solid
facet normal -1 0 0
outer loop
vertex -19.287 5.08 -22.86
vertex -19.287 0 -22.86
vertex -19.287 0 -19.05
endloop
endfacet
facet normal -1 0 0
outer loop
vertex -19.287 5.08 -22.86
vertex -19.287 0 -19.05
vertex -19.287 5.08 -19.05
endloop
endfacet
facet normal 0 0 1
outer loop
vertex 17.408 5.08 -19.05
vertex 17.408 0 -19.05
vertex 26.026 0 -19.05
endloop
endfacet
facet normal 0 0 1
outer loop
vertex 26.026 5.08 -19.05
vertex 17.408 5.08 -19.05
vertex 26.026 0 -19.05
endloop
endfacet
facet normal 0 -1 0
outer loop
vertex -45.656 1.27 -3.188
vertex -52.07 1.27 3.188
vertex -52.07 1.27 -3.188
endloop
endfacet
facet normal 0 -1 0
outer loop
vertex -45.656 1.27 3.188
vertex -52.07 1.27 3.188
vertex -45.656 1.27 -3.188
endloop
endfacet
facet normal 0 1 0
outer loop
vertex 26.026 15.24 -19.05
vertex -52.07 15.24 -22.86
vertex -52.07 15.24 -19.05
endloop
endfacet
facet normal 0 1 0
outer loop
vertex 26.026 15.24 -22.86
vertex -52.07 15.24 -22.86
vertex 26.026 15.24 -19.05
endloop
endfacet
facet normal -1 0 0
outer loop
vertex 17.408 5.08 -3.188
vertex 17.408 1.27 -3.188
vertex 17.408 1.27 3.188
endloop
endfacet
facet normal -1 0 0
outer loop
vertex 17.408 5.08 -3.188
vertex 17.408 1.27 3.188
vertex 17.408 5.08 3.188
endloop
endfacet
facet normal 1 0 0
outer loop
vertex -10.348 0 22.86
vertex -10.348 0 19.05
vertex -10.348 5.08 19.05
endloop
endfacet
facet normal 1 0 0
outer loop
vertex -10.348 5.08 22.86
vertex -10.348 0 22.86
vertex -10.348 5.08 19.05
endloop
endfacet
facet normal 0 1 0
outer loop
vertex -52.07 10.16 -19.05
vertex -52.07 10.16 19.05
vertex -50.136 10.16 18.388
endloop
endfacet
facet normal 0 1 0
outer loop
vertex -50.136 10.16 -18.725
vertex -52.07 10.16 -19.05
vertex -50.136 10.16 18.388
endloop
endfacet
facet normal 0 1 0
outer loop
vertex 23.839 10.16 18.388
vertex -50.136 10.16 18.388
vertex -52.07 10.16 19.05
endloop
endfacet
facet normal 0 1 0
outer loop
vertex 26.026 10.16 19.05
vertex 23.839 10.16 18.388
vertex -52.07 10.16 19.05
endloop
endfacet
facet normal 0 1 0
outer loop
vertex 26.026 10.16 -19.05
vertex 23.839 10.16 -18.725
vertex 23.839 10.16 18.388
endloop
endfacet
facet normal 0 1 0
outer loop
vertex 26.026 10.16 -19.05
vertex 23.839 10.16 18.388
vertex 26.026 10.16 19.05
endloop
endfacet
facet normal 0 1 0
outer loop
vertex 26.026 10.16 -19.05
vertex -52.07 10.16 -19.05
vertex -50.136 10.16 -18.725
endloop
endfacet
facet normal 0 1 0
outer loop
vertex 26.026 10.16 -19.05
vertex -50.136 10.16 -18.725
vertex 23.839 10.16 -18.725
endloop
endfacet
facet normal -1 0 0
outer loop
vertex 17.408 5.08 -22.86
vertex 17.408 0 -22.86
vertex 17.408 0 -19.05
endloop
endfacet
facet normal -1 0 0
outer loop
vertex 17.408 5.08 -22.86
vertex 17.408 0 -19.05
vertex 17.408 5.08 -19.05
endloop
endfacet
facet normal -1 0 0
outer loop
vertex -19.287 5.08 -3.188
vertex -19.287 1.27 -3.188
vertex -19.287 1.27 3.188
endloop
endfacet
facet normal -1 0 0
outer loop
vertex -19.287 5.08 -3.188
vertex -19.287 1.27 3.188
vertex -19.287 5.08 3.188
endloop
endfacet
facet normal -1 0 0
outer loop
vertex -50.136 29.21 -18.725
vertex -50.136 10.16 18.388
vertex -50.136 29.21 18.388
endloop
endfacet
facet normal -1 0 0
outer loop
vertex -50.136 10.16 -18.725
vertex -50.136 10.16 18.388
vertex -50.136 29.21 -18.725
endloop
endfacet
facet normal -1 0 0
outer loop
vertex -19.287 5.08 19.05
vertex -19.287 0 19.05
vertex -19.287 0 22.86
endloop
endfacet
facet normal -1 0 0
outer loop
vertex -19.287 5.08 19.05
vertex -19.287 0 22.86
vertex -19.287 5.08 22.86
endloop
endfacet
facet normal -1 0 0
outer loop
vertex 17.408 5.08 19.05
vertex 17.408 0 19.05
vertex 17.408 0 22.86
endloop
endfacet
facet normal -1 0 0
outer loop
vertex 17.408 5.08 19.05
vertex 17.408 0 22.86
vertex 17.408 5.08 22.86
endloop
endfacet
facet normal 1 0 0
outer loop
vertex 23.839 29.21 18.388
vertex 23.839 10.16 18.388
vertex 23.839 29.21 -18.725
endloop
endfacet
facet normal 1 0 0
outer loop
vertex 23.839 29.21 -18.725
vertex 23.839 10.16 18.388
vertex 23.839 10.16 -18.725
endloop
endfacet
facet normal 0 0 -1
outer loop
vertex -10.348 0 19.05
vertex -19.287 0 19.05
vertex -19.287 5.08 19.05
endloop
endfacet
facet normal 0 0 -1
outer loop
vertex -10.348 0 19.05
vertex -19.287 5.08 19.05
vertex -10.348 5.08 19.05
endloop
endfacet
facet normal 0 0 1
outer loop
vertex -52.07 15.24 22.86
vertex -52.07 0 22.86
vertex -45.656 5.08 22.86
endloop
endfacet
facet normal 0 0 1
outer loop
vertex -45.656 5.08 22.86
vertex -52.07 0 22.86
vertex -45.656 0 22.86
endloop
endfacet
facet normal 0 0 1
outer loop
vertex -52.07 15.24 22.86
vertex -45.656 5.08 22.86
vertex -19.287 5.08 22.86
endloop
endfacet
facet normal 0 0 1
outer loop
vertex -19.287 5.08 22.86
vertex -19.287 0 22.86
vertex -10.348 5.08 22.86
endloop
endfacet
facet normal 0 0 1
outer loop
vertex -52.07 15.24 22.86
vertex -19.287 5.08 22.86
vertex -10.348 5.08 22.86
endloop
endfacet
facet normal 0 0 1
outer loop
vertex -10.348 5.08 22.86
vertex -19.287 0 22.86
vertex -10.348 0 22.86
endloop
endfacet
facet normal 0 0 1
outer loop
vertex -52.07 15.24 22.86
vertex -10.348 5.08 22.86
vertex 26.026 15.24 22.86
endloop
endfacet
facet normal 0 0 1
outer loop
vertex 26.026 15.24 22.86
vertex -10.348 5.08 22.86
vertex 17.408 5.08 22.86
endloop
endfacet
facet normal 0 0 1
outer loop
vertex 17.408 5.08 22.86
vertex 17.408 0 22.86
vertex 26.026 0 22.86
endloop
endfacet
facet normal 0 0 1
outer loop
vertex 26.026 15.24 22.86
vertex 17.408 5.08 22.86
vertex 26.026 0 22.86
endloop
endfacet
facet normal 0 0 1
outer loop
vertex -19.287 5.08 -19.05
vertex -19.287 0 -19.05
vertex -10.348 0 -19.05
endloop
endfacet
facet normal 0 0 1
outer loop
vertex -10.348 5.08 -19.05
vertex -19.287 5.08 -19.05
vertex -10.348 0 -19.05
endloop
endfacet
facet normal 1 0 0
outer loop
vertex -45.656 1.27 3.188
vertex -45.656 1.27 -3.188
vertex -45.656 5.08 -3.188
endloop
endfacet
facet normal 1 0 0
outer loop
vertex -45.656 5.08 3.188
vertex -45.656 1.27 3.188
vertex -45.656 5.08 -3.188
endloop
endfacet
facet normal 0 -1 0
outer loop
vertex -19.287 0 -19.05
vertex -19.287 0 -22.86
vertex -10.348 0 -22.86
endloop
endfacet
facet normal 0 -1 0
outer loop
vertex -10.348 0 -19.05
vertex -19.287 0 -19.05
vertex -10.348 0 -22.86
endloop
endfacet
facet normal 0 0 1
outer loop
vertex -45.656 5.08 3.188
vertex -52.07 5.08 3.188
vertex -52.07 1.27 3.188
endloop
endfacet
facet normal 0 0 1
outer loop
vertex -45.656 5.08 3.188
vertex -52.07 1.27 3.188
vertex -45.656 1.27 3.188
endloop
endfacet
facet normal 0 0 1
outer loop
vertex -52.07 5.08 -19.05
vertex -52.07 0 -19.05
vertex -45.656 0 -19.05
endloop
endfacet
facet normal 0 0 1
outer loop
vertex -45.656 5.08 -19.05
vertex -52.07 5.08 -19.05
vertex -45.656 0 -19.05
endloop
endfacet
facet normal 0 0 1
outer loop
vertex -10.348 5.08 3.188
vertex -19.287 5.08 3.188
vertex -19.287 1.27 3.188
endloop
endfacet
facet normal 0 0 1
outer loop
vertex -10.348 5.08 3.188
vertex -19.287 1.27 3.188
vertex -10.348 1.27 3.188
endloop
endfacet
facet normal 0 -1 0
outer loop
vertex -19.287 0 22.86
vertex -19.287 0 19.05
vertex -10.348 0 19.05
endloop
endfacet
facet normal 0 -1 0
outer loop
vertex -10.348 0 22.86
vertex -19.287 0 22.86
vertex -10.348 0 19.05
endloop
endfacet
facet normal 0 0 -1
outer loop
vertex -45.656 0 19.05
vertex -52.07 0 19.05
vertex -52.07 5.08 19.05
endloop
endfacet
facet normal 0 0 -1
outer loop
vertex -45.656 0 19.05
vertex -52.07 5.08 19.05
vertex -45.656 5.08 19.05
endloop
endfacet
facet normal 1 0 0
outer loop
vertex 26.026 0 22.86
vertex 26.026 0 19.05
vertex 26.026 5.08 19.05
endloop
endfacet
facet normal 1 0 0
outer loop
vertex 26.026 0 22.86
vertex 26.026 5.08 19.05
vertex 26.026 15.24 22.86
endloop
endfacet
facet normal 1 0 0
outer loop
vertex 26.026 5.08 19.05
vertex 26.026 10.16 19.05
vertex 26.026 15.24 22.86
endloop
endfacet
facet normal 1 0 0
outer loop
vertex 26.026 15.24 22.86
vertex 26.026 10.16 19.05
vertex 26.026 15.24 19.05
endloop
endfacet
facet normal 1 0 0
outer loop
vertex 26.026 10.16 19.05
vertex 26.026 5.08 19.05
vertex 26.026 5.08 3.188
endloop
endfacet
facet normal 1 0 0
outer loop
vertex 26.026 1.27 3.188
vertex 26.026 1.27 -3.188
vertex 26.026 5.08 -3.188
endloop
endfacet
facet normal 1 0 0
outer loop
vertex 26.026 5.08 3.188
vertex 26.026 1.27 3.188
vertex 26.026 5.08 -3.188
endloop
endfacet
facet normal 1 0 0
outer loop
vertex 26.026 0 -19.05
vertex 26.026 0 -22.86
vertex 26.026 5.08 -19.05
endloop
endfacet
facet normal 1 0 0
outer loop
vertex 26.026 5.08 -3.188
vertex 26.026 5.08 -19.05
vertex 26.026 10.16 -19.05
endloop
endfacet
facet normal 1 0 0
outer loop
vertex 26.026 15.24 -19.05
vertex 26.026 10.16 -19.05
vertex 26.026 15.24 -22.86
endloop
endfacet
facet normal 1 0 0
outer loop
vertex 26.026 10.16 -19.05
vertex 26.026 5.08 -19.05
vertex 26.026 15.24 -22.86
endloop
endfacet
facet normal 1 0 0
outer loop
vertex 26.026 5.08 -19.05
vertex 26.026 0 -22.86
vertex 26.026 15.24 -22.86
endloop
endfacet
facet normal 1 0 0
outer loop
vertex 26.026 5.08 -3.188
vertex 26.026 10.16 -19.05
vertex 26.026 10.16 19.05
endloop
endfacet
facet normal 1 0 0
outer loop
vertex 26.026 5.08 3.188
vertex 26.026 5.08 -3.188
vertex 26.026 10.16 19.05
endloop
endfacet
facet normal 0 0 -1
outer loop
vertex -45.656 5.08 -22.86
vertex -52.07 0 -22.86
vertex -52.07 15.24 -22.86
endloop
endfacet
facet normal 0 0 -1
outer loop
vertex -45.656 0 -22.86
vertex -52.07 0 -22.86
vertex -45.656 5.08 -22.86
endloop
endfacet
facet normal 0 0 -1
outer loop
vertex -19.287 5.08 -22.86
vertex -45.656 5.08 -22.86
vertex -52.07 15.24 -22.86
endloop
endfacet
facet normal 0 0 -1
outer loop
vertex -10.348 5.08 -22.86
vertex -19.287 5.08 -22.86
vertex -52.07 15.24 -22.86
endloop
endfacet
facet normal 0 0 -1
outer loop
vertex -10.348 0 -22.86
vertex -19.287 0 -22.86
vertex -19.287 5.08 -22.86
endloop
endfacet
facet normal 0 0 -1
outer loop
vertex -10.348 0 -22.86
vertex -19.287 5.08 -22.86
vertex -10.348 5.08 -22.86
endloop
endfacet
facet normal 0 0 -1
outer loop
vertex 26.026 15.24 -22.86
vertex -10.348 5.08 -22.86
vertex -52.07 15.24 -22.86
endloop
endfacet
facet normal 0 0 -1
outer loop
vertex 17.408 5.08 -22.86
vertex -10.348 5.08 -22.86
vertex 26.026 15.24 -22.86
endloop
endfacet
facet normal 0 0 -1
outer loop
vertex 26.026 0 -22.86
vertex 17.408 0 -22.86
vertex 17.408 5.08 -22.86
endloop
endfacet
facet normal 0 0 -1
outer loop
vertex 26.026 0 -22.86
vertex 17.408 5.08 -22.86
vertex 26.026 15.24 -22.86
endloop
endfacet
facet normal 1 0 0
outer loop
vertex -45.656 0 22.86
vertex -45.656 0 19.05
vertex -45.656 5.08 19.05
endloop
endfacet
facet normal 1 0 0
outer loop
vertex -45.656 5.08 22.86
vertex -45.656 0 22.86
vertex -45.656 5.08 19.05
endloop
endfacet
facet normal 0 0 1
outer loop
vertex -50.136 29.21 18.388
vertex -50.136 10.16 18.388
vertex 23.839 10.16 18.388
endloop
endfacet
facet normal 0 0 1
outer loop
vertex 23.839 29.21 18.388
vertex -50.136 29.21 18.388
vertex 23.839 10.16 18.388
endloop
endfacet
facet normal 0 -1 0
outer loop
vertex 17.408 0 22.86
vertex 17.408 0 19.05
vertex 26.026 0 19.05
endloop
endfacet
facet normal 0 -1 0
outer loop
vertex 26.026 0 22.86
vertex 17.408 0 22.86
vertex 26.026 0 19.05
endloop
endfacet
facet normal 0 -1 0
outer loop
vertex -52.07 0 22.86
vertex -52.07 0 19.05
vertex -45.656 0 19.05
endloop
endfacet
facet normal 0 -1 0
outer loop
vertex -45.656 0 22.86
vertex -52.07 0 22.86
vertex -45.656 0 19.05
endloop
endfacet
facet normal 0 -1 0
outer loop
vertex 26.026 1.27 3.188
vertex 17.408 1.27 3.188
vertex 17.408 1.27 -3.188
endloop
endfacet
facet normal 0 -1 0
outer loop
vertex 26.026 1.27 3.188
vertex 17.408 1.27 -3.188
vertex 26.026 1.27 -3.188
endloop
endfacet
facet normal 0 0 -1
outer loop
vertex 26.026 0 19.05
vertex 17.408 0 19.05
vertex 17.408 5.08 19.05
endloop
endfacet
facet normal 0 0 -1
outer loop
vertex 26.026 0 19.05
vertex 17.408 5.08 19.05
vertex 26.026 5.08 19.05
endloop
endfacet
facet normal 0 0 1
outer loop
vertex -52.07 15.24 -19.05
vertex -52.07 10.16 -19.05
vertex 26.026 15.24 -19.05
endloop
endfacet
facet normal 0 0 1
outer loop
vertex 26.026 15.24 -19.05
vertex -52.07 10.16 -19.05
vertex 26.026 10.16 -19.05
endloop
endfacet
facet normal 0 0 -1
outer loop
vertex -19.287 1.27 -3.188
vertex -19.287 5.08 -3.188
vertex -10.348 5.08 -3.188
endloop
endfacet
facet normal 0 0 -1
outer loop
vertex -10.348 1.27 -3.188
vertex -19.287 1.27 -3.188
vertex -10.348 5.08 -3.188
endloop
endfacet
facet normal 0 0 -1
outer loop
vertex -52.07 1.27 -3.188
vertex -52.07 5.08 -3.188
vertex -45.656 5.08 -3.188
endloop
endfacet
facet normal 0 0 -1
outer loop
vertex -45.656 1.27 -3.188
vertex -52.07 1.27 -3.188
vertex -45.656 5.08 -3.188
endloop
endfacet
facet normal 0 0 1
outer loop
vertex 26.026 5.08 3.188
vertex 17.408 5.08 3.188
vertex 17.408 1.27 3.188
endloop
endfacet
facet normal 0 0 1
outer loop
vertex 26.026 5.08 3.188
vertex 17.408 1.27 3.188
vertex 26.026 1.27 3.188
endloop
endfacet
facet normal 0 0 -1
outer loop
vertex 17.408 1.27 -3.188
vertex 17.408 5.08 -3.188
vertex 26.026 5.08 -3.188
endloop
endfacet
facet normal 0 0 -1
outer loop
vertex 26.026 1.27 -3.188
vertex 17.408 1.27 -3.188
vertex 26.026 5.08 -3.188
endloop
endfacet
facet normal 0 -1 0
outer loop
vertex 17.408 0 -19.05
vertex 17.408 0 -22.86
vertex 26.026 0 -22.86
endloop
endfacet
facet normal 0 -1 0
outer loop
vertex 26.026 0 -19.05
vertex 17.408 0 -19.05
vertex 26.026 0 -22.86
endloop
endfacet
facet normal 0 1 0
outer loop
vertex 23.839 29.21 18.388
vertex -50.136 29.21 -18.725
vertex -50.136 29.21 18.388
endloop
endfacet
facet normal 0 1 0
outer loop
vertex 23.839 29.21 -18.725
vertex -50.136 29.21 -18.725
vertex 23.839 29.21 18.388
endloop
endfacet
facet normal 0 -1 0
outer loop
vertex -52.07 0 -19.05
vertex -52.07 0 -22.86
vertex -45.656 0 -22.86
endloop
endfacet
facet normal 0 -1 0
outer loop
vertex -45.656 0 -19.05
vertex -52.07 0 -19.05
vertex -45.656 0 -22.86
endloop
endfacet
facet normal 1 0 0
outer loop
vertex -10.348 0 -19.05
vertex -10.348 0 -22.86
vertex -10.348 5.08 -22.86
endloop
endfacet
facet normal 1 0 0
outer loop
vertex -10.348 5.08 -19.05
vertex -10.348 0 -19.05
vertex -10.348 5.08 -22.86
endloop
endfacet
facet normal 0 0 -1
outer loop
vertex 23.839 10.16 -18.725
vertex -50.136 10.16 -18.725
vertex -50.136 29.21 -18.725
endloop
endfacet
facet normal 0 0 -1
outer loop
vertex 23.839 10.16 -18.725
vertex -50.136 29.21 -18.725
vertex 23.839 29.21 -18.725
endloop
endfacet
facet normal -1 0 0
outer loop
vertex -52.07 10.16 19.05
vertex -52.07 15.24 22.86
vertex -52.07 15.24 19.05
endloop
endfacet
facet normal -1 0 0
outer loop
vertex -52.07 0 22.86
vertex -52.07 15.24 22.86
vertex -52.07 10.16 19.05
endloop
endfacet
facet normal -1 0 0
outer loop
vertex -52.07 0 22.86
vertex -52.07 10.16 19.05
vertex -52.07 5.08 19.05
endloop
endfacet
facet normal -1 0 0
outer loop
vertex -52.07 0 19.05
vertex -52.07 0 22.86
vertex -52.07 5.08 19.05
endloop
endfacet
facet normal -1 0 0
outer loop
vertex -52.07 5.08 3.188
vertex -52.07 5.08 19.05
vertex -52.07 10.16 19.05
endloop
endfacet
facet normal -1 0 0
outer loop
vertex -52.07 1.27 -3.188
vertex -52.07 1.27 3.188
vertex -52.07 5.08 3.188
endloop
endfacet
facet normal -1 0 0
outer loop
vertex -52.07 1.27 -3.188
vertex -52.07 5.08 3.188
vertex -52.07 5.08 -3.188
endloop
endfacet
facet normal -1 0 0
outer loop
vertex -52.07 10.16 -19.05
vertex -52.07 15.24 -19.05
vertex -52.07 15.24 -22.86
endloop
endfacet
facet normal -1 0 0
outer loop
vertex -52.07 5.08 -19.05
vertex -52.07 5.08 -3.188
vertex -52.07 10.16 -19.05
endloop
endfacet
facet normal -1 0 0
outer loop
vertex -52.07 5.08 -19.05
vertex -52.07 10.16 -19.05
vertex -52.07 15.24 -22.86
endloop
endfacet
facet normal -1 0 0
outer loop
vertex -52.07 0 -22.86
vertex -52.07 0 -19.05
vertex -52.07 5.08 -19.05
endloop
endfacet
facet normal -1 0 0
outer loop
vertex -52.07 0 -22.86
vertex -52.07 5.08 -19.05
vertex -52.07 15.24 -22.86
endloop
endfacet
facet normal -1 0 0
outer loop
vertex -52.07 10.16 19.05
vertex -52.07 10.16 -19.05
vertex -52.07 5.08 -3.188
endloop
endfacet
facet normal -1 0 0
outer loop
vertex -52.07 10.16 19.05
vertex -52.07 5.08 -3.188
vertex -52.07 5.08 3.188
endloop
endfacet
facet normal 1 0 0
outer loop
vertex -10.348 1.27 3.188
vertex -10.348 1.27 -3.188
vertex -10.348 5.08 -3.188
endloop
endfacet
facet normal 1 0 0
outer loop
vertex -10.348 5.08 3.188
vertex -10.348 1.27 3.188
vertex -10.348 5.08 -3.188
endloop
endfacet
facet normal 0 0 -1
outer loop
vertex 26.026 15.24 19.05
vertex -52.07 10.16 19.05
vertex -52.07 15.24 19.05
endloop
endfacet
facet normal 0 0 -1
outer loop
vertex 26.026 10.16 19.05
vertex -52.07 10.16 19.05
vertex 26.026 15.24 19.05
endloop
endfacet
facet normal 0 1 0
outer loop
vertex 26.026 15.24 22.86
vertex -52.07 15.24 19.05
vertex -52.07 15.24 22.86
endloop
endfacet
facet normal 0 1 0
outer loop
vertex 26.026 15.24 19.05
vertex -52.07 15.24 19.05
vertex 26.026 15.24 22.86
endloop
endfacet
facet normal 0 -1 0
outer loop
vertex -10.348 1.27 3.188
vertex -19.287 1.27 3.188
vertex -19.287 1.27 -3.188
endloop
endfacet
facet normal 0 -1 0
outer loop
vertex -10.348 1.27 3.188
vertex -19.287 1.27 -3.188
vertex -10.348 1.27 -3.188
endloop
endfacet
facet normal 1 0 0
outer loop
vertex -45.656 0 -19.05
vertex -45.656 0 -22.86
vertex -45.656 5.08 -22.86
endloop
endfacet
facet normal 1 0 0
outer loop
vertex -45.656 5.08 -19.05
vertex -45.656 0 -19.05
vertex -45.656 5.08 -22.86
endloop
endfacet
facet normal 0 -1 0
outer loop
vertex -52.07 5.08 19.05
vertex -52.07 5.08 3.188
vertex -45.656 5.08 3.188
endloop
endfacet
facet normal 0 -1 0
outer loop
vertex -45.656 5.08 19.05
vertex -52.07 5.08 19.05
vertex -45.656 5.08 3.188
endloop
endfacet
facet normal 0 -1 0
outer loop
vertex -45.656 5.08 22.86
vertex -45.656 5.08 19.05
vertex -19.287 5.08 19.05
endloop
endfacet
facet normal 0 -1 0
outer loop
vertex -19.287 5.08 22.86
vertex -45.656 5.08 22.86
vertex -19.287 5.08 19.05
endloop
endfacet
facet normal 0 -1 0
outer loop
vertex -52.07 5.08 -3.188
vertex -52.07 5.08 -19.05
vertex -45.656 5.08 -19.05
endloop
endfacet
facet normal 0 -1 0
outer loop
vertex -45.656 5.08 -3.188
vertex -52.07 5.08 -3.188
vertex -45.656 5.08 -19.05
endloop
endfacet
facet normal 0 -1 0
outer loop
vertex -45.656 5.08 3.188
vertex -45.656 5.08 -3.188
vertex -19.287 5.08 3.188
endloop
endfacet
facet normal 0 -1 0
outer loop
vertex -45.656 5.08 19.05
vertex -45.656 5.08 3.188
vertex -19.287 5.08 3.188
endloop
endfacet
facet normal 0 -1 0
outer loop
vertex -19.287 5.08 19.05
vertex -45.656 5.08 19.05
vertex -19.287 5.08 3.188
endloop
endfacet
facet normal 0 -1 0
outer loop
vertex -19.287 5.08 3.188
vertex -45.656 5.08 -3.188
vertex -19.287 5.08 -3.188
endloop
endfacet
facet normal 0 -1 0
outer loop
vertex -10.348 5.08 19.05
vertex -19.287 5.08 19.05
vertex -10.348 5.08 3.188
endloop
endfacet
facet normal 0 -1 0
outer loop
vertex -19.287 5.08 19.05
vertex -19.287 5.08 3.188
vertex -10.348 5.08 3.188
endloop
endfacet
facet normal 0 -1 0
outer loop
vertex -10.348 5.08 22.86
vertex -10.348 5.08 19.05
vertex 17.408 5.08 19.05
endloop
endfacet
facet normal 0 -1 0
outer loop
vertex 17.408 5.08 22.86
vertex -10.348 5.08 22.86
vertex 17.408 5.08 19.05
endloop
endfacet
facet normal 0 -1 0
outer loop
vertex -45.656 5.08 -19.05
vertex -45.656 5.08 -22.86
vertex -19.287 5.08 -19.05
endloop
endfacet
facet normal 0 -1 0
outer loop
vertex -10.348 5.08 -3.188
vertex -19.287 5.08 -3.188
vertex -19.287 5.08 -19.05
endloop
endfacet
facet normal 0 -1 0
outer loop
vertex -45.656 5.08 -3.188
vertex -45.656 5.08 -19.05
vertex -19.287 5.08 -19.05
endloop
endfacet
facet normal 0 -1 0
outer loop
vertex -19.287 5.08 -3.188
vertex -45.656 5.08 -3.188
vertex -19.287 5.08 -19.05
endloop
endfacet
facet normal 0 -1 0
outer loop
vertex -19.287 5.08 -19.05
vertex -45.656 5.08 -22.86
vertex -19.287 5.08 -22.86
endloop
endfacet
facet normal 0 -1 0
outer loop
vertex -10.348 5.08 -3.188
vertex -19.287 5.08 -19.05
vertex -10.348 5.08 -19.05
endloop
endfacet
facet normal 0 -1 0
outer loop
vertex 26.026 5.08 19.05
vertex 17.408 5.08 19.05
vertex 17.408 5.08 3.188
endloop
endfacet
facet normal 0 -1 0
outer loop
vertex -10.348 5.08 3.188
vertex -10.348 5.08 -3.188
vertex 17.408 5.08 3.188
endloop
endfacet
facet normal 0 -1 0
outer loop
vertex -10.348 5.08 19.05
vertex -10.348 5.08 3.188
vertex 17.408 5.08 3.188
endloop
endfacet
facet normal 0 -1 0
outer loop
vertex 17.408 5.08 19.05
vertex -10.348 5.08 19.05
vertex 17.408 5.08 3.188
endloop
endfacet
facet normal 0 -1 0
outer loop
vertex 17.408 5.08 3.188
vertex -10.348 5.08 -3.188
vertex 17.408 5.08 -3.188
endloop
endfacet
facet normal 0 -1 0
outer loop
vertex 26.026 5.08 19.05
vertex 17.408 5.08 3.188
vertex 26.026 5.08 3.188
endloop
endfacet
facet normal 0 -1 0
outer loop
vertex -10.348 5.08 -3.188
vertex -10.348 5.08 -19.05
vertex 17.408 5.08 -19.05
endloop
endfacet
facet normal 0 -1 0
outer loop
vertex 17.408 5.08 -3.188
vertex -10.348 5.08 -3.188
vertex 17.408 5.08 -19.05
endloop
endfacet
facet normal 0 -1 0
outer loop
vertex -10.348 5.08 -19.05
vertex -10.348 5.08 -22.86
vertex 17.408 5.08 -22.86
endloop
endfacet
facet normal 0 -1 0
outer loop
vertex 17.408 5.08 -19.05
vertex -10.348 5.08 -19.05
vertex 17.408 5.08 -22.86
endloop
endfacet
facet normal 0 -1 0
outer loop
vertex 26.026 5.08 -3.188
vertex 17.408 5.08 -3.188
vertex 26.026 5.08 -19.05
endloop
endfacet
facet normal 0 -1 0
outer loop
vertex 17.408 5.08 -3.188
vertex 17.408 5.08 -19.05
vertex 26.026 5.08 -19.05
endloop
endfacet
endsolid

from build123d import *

# Parameters (mm, degrees)
SKETCH1_W               = 104.14
SKETCH1_H               = 3.81
BOSS_EXTRUDE1_DEPTH     = 5.08
BOSS_EXTRUDE1_2_DEPTH   = 5.08
SKETCH2_W               = 104.14
SKETCH2_H               = 45.72
BOSS_EXTRUDE2_DEPTH     = 5.08
SKETCH3_W               = 104.14
SKETCH3_H               = 3.81
BOSS_EXTRUDE3_DEPTH     = 5.08
SKETCH4_W               = 104.14
SKETCH4_H               = 6.3754
BOSS_EXTRUDE4_DEPTH     = 3.81
CUT_EXTRUDE1_DEPTH      = 71.949706835
CUT_EXTRUDE1_DEPTH_BACK = 71.949706835
SKETCH5_W               = 26.368614406
SKETCH5_H               = 5.08
SKETCH5_W_2             = 27.756452018
SKETCH5_W_3             = 30.305435834
SKETCH5_H_2             = 26.045246771
SKETCH6_W               = 73.974469525
SKETCH6_H               = 37.113471059
BOSS_EXTRUDE5_DEPTH     = 19.05


with BuildPart() as part:
    # Sketch1 → Boss-Extrude1 (new body)
    with BuildSketch(Plane(origin=(0, 0, 0), x_dir=(1, 0, 0), z_dir=(0, 1, 0))):
        with Locations((0, -20.955)):
            Rectangle(SKETCH1_W, SKETCH1_H)
    extrude(amount=BOSS_EXTRUDE1_DEPTH)



with BuildPart() as body_2:
    # Sketch1 → Boss-Extrude1 2 (new body)
    with BuildSketch(Plane(origin=(0, 0, 0), x_dir=(1, 0, 0), z_dir=(0, 1, 0))):
        with Locations((0, 20.955)):
            Rectangle(SKETCH1_W, SKETCH1_H)
    extrude(amount=BOSS_EXTRUDE1_2_DEPTH)


with BuildPart() as part_1:
    add(part.part)

    add(body_2.part)  # Boss-Extrude2 merges body 2
    # Sketch2 → Boss-Extrude2 (add)
    with BuildSketch(Plane(origin=(0, 5.08, 0), x_dir=(1, 0, 0), z_dir=(0, 1, 0))):
        Rectangle(SKETCH2_W, SKETCH2_H)
    extrude(amount=BOSS_EXTRUDE2_DEPTH)

    # Sketch3 → Boss-Extrude3 (add)
    with BuildSketch(Plane(origin=(0, 10.16, 0), x_dir=(1, 0, 0), z_dir=(0, 1, 0))):
        with Locations((0, 20.955)):
            Rectangle(SKETCH3_W, SKETCH3_H)
        with Locations((0, -20.955)):
            Rectangle(SKETCH3_W, SKETCH3_H)
    extrude(amount=BOSS_EXTRUDE3_DEPTH)

    # Sketch4 → Boss-Extrude4 (add)
    with BuildSketch(Plane.XZ.offset(-5.08)):
        Rectangle(SKETCH4_W, SKETCH4_H)
    extrude(amount=BOSS_EXTRUDE4_DEPTH)

    # Sketch5 → Cut-Extrude1 (cut, two sides: drawn at the far end of the back side and taken through both)
    with BuildSketch(Plane.XY.offset(22.86).offset(-CUT_EXTRUDE1_DEPTH_BACK)):
        with Locations((-32.471537131, 2.54)):
            Rectangle(SKETCH5_W, SKETCH5_H)
        with Locations((3.530263491, 2.54)):
            Rectangle(SKETCH5_W_2, SKETCH5_H)
        with Locations((41.178408022, 7.587510726)):
            Rectangle(SKETCH5_W_3, SKETCH5_H_2)
    extrude(amount=CUT_EXTRUDE1_DEPTH + CUT_EXTRUDE1_DEPTH_BACK, mode=Mode.SUBTRACT)

    # Sketch6 → Boss-Extrude5 (add)
    with BuildSketch(Plane(origin=(0, 10.16, 0), x_dir=(1, 0, 0), z_dir=(0, 1, 0))):
        with Locations((-13.148391244, 0.168315062)):
            Rectangle(SKETCH6_W, SKETCH6_H)
    extrude(amount=BOSS_EXTRUDE5_DEPTH)


solid = part_1.part
